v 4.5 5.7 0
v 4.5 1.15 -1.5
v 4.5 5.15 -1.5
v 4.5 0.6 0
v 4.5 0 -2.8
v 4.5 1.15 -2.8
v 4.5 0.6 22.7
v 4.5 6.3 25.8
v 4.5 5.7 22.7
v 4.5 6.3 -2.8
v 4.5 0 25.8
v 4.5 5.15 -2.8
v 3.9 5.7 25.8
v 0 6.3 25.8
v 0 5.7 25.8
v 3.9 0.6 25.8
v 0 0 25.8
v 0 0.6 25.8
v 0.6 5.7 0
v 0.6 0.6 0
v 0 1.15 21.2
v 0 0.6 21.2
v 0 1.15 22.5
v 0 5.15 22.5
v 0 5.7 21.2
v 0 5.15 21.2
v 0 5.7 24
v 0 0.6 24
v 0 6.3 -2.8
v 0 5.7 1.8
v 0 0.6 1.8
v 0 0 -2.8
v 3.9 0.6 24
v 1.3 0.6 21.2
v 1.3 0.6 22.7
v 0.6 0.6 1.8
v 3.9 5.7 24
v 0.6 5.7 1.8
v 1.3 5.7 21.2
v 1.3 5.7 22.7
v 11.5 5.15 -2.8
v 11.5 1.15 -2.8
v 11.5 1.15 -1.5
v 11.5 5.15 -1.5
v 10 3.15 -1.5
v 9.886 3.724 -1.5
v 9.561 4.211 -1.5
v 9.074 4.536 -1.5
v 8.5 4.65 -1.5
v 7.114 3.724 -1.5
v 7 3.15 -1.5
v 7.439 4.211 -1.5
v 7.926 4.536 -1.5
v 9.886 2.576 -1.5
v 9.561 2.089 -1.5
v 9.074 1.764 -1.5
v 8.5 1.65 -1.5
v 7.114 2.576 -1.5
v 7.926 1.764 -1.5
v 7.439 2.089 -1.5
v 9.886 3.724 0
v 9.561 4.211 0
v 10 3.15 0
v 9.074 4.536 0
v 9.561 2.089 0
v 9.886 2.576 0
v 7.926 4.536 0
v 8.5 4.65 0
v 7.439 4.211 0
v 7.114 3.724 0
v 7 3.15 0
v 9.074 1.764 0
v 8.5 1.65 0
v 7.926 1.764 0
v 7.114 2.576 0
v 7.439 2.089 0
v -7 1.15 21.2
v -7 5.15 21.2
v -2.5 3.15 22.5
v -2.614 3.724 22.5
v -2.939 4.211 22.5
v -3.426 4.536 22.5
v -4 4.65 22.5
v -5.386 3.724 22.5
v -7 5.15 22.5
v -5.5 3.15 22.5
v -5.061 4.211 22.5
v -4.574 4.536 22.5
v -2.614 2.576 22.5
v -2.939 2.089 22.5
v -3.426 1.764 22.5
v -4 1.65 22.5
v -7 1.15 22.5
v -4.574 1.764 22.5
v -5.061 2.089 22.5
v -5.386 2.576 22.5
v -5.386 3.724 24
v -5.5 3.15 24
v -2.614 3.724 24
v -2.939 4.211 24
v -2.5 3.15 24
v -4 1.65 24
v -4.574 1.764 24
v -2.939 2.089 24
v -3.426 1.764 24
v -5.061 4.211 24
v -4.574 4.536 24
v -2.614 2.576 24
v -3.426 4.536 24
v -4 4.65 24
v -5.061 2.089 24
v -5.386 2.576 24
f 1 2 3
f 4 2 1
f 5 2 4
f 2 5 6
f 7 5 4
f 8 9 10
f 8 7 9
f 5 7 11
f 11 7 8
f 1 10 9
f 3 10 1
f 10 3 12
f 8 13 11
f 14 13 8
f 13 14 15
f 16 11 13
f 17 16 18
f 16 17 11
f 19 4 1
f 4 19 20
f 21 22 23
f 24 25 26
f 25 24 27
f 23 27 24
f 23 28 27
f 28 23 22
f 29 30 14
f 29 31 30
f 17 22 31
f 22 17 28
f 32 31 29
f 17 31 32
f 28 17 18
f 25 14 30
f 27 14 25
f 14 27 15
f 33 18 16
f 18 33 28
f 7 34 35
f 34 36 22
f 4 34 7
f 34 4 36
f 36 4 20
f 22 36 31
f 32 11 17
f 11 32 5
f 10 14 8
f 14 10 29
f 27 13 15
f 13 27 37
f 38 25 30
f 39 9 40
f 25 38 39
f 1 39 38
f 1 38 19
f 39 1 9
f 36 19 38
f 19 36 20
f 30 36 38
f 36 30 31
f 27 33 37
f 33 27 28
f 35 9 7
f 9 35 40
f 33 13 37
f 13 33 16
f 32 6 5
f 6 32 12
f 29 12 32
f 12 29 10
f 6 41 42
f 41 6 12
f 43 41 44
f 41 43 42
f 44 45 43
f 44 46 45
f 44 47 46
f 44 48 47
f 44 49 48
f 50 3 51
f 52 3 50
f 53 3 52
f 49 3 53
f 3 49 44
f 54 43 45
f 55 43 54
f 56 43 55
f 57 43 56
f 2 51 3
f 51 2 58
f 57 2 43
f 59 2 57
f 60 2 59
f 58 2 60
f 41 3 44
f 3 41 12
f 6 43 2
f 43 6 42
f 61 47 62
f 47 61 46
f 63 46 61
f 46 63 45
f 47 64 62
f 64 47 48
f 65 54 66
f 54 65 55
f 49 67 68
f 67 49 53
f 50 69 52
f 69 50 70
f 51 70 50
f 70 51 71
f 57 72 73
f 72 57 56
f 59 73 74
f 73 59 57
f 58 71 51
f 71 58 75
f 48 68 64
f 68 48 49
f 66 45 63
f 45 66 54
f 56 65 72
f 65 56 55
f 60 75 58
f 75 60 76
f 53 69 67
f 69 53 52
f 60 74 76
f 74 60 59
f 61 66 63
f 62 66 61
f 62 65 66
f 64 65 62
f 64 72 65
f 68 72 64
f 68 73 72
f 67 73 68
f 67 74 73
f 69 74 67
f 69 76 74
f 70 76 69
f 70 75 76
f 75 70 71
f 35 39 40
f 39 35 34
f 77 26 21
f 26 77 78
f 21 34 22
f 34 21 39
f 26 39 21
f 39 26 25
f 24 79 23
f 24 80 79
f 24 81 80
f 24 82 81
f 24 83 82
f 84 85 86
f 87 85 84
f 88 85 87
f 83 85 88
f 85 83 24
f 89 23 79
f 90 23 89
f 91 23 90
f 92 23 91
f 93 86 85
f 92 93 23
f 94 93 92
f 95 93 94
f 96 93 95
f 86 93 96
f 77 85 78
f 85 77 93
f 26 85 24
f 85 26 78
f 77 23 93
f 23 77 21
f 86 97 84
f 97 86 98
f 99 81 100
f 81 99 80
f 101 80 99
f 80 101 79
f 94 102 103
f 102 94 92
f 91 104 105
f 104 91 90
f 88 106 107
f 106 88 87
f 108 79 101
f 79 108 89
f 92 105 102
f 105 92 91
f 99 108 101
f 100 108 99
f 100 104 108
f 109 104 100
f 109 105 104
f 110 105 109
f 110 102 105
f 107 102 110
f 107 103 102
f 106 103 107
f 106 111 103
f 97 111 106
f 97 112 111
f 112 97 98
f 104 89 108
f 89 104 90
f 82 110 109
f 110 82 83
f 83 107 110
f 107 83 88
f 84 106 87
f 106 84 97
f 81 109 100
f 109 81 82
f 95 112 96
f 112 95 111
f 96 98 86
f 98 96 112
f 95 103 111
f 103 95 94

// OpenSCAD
WS = 0.3;   // pixel to mm
TH = 1.3 / WS;   // minimum thickness
TH2 = 0.6 / WS;

l1 = 208.36;
l2 = 128.36;
h = abs(l2 - l1);
w = 21;
d = 15;
cw = max(w - 6 / WS, 4 / WS);
cl = 7 / WS;
// echo("Connector length: " + (cl * WS) + "mm");

scale([WS, WS, WS]) {
  // floor & pillars
  *difference() {
    translate([0, 0, -TH]) cube([d, w, h + TH]);
    translate([-5, TH, 0]) cube([d + 10, w - TH * 2, h - TH]);
    translate([TH, -5, 0]) cube([d - TH * 2, w + 10, h - TH]);
  }

  // lower box
  cube([d, TH2, h + 6]);
  translate([0, w - TH2, 0]) cube([d, TH2, h + 6]);
  cube([TH2, w, 6]);

  translate([0, 0, h - TH]) cube([d, w, TH]);
  translate([d-TH2, 0, h-1]) cube([TH2, w, 6+1]);

  // lower connector
  translate([0, 0, -(TH+1.5/WS)]) cube([d, w, TH+1.5/WS]);
  translate([d, (w - cw) / 2, -(TH+1.5/WS)]) cube([cl, cw, TH]);
  translate([d+4/WS, w/2, -1.7/WS]) cylinder(r=1.5/WS, h=1.7/WS);

  // upper box
  *translate([0, 0, h]) {
    cube([d, TH2, 6]);
    translate([0, w - TH2, 0]) cube([d, TH2, 6]);
    translate([d - TH2, 0, 0]) cube([TH2, w, 6]);
  }

  // upper connector
  translate([0, 0, h - (TH+1.5/WS)]) cube([TH, w, TH+1.5/WS]);
  translate([-cl, (w - cw) / 2, h - (TH+1.5/WS)]) cube([cl, cw, TH]);
  translate([-4/WS, w/2, h-1.7/WS]) cylinder(r=1.5/WS, h=1.7/WS);
}
